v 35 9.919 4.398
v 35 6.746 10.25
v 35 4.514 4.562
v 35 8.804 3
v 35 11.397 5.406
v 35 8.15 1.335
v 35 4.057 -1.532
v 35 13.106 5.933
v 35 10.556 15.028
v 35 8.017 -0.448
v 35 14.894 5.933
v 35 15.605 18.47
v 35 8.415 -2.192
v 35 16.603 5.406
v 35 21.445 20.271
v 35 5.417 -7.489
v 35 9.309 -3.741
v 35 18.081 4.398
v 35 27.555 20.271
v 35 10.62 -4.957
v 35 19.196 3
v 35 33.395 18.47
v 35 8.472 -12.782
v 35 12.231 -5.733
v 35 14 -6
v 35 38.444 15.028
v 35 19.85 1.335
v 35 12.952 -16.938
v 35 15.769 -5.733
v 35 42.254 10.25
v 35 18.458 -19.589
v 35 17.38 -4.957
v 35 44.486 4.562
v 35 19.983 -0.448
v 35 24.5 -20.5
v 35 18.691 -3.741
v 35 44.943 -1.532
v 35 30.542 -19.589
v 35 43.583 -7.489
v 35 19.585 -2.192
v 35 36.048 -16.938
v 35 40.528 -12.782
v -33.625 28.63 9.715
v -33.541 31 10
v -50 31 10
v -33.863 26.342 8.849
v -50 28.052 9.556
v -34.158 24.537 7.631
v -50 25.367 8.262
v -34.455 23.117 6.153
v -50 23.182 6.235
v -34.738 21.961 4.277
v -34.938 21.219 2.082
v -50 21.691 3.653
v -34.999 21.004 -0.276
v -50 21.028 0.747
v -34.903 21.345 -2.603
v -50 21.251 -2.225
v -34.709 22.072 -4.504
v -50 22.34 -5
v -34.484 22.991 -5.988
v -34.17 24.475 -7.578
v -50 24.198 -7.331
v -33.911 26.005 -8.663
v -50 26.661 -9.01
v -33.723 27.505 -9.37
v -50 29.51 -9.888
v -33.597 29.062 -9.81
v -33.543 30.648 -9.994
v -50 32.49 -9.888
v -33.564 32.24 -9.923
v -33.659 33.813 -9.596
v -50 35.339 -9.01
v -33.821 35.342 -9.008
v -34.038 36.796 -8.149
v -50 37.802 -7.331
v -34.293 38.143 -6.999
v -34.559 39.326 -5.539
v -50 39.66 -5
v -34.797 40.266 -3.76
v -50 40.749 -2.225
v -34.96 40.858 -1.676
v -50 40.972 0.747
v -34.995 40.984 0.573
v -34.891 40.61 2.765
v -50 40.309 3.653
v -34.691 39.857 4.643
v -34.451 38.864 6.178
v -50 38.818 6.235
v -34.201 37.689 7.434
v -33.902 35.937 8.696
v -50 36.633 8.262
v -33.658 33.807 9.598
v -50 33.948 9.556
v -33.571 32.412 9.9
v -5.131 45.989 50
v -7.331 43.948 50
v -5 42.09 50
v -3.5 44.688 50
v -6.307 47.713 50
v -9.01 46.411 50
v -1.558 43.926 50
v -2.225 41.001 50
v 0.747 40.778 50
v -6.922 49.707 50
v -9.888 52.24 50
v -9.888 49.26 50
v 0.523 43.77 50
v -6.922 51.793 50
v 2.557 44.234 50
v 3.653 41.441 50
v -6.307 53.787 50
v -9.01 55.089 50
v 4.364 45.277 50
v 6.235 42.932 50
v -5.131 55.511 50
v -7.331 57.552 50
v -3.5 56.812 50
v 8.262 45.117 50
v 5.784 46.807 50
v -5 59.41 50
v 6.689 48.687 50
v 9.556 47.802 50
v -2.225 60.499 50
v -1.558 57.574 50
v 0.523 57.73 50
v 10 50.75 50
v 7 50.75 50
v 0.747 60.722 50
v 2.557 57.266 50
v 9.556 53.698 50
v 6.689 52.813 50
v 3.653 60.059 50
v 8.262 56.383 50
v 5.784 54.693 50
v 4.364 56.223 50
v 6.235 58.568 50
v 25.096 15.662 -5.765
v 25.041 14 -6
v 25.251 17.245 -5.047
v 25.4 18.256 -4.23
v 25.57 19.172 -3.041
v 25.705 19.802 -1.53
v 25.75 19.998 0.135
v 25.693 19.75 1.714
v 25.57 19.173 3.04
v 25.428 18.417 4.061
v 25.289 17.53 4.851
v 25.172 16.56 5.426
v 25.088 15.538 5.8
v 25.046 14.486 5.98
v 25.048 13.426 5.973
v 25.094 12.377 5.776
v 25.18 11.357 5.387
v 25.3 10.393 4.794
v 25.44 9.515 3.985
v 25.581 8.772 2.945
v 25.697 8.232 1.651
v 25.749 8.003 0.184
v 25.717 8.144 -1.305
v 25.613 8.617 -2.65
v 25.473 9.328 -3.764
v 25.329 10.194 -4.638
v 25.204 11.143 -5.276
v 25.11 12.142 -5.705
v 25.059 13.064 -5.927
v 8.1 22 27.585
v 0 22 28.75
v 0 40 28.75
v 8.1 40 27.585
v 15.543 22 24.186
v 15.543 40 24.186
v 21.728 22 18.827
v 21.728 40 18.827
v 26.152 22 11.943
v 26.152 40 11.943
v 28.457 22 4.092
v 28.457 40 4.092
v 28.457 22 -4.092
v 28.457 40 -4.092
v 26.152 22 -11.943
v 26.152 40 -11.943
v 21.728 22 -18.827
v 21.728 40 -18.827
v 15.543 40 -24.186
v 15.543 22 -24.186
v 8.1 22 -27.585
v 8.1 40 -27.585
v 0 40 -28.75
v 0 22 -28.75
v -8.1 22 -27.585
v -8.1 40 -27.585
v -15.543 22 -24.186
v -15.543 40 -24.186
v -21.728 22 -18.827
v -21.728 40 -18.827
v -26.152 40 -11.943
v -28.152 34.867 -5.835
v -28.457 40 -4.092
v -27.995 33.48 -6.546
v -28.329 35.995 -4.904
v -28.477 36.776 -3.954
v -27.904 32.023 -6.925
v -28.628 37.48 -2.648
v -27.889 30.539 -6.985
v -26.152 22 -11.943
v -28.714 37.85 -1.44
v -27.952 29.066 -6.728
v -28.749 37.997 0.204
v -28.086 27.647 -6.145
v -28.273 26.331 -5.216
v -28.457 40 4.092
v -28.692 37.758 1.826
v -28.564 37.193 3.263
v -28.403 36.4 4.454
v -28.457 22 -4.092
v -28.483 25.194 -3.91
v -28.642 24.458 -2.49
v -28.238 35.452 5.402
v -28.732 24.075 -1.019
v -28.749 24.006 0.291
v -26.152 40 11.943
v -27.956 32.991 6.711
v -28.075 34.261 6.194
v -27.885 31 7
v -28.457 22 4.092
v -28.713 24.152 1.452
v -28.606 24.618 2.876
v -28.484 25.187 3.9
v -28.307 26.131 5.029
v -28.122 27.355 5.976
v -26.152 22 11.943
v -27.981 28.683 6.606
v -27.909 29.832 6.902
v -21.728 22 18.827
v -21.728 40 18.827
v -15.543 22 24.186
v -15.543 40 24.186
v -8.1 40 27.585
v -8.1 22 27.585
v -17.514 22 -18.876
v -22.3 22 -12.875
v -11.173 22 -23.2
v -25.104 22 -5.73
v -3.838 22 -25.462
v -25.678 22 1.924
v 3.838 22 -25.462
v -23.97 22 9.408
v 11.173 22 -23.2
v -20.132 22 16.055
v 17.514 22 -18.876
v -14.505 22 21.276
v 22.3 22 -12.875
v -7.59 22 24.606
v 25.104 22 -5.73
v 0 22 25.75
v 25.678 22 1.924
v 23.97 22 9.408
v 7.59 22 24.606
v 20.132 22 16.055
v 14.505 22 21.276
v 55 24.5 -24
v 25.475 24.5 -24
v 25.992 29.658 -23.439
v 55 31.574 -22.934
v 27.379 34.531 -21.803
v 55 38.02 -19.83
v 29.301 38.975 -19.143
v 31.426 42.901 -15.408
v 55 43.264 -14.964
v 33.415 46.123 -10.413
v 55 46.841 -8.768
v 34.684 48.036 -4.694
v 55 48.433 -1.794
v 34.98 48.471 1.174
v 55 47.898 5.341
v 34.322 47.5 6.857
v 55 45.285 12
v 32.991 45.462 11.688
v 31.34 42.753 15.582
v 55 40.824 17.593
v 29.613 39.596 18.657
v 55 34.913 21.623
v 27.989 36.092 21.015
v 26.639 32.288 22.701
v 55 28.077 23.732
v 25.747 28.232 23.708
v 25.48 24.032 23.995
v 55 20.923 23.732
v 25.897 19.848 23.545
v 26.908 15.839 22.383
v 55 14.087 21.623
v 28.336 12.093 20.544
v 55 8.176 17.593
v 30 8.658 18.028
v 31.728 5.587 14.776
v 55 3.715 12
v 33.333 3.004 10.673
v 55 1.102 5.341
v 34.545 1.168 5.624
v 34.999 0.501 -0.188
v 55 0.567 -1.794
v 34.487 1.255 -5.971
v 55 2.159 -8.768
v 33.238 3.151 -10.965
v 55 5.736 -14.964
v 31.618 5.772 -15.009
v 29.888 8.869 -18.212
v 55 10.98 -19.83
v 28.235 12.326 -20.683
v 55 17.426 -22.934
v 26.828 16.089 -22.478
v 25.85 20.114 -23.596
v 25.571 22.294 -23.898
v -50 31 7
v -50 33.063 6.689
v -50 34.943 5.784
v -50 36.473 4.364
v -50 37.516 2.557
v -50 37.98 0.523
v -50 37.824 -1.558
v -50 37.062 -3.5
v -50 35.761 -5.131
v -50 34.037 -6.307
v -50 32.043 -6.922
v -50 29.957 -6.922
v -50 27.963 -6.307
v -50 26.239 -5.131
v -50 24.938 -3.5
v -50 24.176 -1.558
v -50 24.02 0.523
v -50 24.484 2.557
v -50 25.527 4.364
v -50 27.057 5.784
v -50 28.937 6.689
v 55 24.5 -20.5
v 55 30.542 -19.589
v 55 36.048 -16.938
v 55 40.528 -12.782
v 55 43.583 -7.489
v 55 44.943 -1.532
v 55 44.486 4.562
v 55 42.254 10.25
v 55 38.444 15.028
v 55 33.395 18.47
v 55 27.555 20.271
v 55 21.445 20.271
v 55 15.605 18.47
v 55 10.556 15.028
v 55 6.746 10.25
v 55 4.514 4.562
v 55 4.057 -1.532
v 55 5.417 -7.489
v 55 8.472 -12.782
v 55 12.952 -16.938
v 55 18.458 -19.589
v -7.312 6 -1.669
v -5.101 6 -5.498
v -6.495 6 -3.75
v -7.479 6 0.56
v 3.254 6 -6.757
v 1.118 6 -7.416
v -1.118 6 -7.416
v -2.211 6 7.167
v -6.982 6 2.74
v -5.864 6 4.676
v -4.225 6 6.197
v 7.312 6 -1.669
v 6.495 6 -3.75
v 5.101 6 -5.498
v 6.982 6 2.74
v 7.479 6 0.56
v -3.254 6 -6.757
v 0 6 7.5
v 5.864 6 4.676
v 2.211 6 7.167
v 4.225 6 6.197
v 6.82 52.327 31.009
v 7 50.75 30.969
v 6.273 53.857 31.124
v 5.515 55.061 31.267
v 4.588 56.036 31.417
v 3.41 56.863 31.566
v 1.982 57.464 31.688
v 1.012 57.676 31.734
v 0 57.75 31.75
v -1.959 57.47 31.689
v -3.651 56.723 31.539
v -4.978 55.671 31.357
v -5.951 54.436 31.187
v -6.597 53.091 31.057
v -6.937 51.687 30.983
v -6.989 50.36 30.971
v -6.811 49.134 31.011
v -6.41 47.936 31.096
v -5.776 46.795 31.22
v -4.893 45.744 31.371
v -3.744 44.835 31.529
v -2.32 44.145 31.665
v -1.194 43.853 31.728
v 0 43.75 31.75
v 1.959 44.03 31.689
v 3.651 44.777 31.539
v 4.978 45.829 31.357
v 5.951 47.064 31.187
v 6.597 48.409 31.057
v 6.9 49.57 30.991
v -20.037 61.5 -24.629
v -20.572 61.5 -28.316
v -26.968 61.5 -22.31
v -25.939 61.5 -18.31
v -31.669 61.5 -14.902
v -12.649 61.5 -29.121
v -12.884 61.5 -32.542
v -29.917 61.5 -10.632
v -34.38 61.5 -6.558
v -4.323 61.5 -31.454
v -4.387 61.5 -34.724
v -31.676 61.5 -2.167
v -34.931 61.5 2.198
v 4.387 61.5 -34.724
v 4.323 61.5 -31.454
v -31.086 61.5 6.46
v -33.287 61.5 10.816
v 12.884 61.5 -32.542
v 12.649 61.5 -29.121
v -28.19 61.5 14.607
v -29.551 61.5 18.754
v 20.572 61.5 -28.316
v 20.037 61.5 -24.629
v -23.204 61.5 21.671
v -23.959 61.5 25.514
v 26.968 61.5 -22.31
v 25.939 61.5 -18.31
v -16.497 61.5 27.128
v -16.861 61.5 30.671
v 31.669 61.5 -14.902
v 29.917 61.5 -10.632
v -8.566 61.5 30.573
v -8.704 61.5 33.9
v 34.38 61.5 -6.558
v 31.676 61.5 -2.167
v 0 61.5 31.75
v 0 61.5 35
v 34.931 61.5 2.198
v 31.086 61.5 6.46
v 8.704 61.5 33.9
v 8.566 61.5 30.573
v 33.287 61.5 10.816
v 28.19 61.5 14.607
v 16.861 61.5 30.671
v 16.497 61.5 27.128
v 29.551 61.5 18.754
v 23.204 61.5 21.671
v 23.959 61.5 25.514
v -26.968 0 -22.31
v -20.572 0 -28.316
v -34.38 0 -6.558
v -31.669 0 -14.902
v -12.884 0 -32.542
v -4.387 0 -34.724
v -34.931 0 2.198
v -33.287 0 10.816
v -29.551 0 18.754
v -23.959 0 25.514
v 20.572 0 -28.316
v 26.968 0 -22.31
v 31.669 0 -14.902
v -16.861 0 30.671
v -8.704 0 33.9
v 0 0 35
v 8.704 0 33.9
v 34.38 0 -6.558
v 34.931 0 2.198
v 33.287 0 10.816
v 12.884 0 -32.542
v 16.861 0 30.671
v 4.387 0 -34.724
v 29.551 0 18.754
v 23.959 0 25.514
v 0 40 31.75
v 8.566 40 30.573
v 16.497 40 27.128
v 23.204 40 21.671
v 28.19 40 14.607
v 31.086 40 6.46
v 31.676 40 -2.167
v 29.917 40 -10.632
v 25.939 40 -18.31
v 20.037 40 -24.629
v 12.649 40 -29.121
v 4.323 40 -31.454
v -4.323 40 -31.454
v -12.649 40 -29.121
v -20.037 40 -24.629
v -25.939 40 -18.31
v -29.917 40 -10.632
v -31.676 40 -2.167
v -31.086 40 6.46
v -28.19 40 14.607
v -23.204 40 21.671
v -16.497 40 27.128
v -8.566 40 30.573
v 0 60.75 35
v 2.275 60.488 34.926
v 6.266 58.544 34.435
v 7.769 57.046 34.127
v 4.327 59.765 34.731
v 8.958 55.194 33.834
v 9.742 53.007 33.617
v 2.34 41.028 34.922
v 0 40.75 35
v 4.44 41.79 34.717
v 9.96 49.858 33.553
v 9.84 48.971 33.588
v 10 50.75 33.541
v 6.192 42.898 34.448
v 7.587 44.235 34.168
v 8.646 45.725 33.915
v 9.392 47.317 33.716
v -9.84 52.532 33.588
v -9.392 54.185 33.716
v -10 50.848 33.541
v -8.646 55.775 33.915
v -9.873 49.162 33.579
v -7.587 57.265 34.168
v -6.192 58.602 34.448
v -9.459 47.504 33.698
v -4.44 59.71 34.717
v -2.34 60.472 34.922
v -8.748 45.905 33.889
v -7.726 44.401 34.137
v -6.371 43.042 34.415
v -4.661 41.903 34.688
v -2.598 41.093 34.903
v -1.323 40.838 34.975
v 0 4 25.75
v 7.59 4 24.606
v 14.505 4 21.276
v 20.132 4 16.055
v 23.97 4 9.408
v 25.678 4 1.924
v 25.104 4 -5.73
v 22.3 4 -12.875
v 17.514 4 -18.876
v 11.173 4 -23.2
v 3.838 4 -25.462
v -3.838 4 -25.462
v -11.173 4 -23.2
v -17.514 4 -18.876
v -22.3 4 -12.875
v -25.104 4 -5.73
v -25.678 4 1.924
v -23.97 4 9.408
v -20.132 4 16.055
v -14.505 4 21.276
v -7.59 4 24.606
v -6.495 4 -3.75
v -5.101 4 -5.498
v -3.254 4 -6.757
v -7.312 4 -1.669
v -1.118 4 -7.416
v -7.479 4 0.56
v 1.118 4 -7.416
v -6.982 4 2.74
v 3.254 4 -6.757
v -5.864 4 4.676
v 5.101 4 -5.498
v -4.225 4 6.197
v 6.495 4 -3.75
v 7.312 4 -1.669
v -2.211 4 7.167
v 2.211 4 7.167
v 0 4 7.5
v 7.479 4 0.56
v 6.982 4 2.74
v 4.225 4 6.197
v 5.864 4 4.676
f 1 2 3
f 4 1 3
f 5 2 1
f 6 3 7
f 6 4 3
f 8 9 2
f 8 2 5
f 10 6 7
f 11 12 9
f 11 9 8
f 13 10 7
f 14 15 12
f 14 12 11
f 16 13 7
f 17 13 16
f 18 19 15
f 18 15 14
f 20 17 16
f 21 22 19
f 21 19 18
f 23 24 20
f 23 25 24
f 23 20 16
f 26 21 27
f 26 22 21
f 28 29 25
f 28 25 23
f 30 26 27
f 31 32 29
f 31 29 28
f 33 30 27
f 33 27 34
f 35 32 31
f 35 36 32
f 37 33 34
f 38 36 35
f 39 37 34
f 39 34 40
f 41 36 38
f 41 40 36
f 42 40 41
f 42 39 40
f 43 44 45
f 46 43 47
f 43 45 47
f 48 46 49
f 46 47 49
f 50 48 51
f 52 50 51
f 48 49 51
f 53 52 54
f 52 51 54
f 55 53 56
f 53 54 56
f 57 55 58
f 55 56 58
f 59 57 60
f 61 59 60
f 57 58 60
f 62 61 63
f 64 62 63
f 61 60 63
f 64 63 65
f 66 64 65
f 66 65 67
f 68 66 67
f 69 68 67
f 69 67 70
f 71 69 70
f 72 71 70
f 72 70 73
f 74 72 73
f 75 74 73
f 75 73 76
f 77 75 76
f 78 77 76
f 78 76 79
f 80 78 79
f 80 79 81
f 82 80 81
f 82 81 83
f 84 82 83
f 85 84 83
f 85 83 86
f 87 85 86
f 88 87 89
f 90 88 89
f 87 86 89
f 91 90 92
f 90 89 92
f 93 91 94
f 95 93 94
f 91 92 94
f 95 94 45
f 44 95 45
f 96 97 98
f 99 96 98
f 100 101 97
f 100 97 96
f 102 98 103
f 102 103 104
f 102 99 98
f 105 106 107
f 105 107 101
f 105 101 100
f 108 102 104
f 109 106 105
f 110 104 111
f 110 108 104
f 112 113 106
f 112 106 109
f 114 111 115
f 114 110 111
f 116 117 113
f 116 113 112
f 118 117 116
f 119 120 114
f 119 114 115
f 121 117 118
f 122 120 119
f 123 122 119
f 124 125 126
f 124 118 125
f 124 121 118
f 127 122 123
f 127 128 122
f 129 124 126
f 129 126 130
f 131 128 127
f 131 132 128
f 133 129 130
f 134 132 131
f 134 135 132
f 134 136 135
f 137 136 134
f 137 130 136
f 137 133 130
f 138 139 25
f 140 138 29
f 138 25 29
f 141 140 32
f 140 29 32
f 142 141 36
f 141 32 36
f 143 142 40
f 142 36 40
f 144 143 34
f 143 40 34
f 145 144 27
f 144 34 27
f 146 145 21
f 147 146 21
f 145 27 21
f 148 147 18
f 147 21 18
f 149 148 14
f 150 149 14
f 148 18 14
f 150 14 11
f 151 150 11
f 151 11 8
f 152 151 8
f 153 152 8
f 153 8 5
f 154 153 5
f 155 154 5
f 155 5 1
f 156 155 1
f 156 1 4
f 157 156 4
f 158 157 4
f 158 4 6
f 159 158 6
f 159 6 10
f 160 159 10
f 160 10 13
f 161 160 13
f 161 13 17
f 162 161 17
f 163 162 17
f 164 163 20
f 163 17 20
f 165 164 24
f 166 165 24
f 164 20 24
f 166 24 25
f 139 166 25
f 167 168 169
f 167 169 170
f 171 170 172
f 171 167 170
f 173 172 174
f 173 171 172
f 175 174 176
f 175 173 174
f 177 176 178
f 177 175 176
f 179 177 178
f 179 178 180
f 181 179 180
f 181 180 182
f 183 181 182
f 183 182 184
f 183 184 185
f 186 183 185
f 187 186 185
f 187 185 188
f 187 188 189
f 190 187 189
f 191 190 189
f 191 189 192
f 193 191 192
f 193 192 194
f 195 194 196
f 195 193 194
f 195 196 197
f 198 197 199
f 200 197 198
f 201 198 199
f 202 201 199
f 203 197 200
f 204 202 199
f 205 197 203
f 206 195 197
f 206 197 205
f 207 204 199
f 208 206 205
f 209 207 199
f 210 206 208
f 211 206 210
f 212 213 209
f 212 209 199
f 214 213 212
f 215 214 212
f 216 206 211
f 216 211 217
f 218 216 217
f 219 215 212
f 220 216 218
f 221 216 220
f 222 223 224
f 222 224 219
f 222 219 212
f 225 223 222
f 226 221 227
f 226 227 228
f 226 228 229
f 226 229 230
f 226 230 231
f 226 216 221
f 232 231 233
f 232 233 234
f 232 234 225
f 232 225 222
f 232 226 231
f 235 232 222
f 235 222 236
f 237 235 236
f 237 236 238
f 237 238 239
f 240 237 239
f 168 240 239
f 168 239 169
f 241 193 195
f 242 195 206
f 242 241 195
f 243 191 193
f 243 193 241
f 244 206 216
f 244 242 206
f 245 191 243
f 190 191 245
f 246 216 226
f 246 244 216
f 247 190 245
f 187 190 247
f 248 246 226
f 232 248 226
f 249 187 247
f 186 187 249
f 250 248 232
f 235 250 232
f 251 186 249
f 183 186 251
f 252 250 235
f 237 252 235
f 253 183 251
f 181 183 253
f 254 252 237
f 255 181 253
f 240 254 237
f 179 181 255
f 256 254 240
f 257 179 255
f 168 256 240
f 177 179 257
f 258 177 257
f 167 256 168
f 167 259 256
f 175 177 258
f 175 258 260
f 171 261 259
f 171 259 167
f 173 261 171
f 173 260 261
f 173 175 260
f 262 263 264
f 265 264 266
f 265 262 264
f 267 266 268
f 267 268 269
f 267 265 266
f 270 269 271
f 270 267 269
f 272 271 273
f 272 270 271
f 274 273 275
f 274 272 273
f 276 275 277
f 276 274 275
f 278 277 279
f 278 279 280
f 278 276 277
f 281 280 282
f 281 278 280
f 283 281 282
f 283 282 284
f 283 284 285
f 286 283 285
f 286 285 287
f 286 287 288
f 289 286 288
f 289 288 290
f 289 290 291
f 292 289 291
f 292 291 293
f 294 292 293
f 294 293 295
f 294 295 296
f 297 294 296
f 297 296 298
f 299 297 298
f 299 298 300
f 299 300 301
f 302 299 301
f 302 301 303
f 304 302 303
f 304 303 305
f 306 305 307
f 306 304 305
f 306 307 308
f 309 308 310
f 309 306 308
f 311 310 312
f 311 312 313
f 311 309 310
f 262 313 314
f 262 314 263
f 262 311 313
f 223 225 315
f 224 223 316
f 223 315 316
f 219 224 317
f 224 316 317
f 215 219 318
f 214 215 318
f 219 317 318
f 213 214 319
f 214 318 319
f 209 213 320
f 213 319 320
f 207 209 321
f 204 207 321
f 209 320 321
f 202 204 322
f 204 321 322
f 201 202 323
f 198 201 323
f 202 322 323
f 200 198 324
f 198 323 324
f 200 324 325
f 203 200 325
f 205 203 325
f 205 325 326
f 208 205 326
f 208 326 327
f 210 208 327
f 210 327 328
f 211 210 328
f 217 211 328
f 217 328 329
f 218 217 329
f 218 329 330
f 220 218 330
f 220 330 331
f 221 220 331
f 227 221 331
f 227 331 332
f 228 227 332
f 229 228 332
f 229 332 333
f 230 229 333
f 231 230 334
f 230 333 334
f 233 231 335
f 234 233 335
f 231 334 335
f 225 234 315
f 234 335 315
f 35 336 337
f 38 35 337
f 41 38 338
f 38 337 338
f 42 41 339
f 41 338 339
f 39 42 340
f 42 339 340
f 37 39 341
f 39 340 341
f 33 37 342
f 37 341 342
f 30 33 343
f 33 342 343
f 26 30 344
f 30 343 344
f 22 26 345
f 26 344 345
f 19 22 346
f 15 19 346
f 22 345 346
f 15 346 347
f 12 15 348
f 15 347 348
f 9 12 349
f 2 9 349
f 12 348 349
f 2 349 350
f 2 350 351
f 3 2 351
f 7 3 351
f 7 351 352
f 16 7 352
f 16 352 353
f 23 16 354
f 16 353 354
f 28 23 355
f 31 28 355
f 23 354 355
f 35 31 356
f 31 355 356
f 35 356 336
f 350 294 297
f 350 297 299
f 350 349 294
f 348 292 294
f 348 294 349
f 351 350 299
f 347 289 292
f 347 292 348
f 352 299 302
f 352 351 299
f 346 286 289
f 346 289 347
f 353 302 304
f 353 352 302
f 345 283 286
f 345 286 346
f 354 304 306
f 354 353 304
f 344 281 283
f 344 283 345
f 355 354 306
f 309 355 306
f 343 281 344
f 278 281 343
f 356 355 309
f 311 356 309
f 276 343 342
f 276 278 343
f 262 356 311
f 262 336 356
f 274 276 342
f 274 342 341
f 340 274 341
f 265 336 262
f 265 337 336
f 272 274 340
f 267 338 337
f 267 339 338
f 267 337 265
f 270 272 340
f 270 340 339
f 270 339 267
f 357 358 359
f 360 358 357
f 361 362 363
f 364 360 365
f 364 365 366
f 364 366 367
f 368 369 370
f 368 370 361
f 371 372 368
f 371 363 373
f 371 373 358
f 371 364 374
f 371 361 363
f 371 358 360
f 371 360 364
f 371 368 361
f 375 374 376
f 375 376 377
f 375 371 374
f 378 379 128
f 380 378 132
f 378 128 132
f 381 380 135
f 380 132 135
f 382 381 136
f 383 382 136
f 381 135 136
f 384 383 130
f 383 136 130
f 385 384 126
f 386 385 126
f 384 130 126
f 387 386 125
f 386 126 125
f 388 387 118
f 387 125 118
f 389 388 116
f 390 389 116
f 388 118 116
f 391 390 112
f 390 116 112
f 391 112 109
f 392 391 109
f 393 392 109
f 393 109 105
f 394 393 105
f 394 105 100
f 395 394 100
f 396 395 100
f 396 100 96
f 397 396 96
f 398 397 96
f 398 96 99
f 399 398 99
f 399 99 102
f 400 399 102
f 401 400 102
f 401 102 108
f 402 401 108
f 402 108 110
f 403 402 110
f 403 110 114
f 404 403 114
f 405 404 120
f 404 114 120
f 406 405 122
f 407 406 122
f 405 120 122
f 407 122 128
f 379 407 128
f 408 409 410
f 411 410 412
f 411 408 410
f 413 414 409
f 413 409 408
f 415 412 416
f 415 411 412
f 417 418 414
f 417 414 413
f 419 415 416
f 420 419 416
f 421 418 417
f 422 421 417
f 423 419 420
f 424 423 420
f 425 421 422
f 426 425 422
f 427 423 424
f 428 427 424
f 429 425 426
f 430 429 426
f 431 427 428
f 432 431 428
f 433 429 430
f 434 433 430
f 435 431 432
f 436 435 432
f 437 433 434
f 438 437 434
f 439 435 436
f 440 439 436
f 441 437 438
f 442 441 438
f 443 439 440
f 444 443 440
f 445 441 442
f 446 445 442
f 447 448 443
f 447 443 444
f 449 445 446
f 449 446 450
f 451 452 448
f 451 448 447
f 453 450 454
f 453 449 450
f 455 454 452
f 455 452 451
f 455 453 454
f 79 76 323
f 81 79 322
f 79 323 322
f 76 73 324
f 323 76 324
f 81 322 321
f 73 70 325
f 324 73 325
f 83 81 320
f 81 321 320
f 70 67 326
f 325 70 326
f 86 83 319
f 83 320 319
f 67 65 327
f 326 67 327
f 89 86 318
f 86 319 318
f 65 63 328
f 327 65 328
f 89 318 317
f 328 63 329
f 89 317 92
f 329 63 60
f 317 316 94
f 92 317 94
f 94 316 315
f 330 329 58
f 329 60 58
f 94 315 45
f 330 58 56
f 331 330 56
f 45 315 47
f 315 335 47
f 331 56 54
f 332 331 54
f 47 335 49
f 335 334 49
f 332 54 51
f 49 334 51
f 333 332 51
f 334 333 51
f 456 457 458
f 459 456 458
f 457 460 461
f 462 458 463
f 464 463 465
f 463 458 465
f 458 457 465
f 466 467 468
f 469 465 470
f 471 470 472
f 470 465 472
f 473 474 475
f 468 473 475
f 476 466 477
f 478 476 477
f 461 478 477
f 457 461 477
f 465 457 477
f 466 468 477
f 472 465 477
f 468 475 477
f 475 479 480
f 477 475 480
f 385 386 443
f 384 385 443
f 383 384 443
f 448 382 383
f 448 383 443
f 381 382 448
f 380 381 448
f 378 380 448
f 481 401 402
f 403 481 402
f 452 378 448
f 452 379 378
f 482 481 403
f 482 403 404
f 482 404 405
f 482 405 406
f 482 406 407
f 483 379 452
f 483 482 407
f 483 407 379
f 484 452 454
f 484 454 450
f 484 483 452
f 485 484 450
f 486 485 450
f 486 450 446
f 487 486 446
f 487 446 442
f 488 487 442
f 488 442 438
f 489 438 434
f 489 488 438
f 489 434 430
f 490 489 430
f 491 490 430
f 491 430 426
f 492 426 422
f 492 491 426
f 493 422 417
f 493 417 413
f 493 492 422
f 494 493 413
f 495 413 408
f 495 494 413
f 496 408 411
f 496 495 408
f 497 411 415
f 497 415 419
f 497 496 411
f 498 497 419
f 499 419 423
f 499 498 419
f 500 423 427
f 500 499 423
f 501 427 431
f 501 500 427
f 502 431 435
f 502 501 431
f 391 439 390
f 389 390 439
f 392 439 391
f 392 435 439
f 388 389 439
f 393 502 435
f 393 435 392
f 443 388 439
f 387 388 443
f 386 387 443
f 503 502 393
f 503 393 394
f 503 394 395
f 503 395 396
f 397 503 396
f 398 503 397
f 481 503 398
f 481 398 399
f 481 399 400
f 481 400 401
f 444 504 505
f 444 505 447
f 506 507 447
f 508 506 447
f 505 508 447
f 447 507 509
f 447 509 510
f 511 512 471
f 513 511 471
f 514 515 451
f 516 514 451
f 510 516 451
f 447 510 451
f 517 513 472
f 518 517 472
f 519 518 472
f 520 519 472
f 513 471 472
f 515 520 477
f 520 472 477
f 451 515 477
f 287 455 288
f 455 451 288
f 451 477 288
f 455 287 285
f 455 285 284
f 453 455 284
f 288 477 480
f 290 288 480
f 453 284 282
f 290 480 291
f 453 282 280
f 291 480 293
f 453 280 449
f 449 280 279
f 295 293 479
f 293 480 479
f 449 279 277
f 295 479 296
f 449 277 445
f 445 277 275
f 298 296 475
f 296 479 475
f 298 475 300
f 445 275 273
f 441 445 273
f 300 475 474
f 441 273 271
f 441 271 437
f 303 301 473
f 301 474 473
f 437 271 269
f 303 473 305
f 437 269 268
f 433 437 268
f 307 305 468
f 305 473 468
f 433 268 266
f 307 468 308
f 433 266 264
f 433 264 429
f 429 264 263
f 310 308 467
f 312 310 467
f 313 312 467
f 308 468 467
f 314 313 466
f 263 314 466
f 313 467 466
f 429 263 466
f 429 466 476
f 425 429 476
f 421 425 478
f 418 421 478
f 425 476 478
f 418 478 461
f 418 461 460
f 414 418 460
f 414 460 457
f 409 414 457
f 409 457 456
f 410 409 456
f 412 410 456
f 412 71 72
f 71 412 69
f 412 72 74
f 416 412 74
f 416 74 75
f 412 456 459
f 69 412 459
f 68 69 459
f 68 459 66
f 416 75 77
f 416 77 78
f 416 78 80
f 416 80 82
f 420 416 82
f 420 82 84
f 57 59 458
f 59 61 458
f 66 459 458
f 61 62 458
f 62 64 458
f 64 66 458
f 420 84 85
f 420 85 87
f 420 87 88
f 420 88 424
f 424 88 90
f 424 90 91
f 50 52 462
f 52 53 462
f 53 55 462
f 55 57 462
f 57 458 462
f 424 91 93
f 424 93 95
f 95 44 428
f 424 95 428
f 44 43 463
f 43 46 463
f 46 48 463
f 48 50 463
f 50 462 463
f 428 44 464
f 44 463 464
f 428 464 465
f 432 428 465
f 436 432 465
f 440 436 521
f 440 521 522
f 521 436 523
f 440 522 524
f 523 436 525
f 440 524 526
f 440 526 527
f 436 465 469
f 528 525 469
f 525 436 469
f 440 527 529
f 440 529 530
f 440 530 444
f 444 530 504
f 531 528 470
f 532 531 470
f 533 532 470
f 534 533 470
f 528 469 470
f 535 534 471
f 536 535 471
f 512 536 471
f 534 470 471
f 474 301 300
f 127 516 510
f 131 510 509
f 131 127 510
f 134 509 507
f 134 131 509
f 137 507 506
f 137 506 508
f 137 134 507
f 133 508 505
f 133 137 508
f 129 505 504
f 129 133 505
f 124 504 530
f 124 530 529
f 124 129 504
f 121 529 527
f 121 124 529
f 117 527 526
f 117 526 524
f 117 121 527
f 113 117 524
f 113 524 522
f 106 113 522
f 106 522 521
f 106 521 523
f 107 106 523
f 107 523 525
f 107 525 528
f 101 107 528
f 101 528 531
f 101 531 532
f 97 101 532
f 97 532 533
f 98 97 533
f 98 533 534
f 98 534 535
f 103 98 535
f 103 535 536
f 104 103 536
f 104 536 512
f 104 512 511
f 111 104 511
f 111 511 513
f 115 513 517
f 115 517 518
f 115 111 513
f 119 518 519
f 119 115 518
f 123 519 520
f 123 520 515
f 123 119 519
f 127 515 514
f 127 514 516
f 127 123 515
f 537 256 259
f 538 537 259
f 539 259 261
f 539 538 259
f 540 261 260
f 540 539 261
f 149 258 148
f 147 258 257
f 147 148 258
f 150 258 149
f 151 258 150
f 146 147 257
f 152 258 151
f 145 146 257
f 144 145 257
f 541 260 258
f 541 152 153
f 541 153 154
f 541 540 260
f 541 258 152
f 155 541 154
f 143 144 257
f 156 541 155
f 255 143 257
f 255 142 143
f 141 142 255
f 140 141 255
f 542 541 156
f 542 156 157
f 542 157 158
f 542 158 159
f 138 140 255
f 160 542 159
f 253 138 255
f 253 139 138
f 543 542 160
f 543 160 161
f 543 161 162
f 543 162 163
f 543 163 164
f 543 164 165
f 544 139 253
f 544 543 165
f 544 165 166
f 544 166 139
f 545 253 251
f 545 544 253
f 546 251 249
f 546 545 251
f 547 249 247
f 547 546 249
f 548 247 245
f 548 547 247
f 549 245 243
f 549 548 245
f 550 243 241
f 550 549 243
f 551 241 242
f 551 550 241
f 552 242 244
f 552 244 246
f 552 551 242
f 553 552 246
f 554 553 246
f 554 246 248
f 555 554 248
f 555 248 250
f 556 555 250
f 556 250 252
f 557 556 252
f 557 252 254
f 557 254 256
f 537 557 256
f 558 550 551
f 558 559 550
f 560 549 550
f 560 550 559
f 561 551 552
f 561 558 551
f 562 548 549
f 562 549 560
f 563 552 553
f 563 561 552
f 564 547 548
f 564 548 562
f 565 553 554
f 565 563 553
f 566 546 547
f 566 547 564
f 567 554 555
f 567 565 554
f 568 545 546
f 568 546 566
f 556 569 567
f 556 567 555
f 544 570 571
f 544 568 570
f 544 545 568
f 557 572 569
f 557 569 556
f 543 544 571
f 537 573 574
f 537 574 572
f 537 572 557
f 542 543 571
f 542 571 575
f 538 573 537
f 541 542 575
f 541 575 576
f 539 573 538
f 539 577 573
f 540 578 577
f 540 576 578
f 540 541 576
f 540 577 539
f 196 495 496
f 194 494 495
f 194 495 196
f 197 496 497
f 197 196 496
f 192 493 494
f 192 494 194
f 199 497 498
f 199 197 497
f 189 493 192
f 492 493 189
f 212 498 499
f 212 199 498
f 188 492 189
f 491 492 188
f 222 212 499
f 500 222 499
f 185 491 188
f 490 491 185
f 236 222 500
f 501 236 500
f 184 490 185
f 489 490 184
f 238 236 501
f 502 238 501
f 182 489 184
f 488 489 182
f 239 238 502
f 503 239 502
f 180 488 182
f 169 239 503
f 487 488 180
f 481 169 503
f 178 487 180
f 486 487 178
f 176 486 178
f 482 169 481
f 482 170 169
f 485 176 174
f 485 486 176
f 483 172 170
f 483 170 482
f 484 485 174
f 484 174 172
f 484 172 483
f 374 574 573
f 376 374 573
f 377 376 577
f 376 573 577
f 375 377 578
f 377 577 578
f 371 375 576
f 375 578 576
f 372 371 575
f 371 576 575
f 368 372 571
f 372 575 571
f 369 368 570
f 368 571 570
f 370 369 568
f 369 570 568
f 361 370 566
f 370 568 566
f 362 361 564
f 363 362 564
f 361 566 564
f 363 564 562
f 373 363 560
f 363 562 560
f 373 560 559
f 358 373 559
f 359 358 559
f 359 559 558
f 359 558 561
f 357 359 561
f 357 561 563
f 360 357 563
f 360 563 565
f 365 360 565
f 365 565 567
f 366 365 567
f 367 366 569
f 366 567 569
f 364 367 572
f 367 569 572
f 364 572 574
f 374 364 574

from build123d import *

# Parameters (mm, degrees)
SKETCH1_R                  = 35
BASE_DEPTH                 = 4
SKETCH2_R                  = 7.5
CENTERING_BOSS_DEPTH       = 2
SKETCH3_R                  = 35
SKETCH3_R_2                = 25.75
INLET_TIER_DEPTH           = 18
SKETCH4_R                  = 35
SKETCH4_R_2                = 28.75
PATIENT_TIER_DEPTH         = 18
SKETCH5_R                  = 35
SKETCH5_R_2                = 31.75
OUTLET_TIER_DEPTH          = 21.5
INLET_REACH                = 116.487
INLET_END_RADIUS           = 35
SKETCH7_R                  = 24
SKETCH10_R                 = 20.5
INLET_ID_DEPTH             = 20
INLET_PASS_THRU_REACH      = 101.535
INLET_PASS_THRU_END_RADIUS = 25.75
SKETCH11_R                 = 6
BOSS_EXTRUDE8_REACH        = 128.619
BOSS_EXTRUDE8_END_RADIUS   = 35
SKETCH12_R                 = 10
CUT_EXTRUDE3_REACH         = 128.619
CUT_EXTRUDE3_END_RADIUS    = 28.75
SKETCH13_R                 = 7
BOSS_EXTRUDE9_REACH        = 120.458
BOSS_EXTRUDE9_END_RADIUS   = 35
SKETCH14_R                 = 10
CUT_EXTRUDE4_REACH         = 120.458
CUT_EXTRUDE4_END_RADIUS    = 31.75
SKETCH15_R                 = 7


with BuildPart() as part:
    # Sketch1 → Base (new body)
    with BuildSketch(Plane(origin=(0, 0, 0), x_dir=(1, 0, 0), z_dir=(0, 1, 0))):
        with Locations(Location((0, 0, 0), (0, 0, 270))):
            Circle(SKETCH1_R)
    extrude(amount=BASE_DEPTH)

    # Sketch2 → Centering boss (add)
    with BuildSketch(Plane(origin=(0, 4, 0), x_dir=(1, 0, 0), z_dir=(0, 1, 0))):
        with Locations(Location((0, 0, 0), (0, 0, 270))):
            Circle(SKETCH2_R)
    extrude(amount=CENTERING_BOSS_DEPTH)

    # Sketch3 → Inlet tier (add)
    with BuildSketch(Plane(origin=(0, 4, 0), x_dir=(1, 0, 0), z_dir=(0, 1, 0))):
        with Locations(Location((0, 0, 0), (0, 0, 270))):
            Circle(SKETCH3_R)
        with Locations(Location((0, 0, 0), (0, 0, 270))):
            Circle(SKETCH3_R_2, mode=Mode.SUBTRACT)
    extrude(amount=INLET_TIER_DEPTH)

    # Sketch4 → Patient tier (add)
    with BuildSketch(Plane(origin=(0, 22, 0), x_dir=(1, 0, 0), z_dir=(0, 1, 0))):
        with Locations(Location((0, 0, 0), (0, 0, 270))):
            Circle(SKETCH4_R)
        with Locations(Location((0, 0, 0), (0, 0, 270))):
            Circle(SKETCH4_R_2, mode=Mode.SUBTRACT)
    extrude(amount=PATIENT_TIER_DEPTH)

    # Sketch5 → Outlet tier (add)
    with BuildSketch(Plane(origin=(0, 40, 0), x_dir=(1, 0, 0), z_dir=(0, 1, 0))):
        with Locations(Location((0, 0, 0), (0, 0, 270))):
            Circle(SKETCH5_R)
        with Locations(Location((0, 0, 0), (0, 0, 270))):
            Circle(SKETCH5_R_2, mode=Mode.SUBTRACT)
    extrude(amount=OUTLET_TIER_DEPTH)

    # Inlet: up to this cylinder (the profile starts outside it)
    inlet_end = Plane(origin=(0, 24.5, 0), z_dir=(0, -1, 0)) * Cylinder(INLET_END_RADIUS, 303.974, mode=Mode.PRIVATE)
    # Sketch7 → Inlet (add, up to the surface)
    with BuildSketch(Plane(origin=(55, 0, 0), x_dir=(0, 0, -1), z_dir=(1, 0, 0)), mode=Mode.PRIVATE) as inlet_sk1:
        with Locations((0, 24.5)):
            Circle(SKETCH7_R)
    inlet_tool1 = extrude(inlet_sk1.sketch, amount=-INLET_REACH, mode=Mode.PRIVATE) - inlet_end
    add(inlet_tool1.solids().sort_by_distance((55, 24.5, 0))[0])

    # Sketch10 → Inlet ID (cut)
    with BuildSketch(Plane(origin=(55, 0, 0), x_dir=(0, 0, -1), z_dir=(1, 0, 0))):
        with Locations((0, 24.5)):
            Circle(SKETCH10_R)
    extrude(amount=-INLET_ID_DEPTH, mode=Mode.SUBTRACT)

    # Inlet pass thru: up to this cylinder (the profile starts outside it)
    inlet_pass_thru_end = Plane(origin=(0, 14, 0), z_dir=(0, -1, 0)) * Cylinder(INLET_PASS_THRU_END_RADIUS, 255.57, mode=Mode.PRIVATE)
    # Sketch11 → Inlet pass thru (cut, up to the surface)
    with BuildSketch(Plane(origin=(35, 0, 0), x_dir=(0, 0, -1), z_dir=(1, 0, 0)), mode=Mode.PRIVATE) as inlet_pass_thru_sk1:
        with Locations((0, 14)):
            Circle(SKETCH11_R)
    inlet_pass_thru_tool1 = extrude(inlet_pass_thru_sk1.sketch, amount=-INLET_PASS_THRU_REACH, mode=Mode.PRIVATE) - inlet_pass_thru_end
    add(inlet_pass_thru_tool1.solids().sort_by_distance((35, 14, 0))[0], mode=Mode.SUBTRACT)

    # Boss-Extrude8: up to this cylinder (the profile starts outside it)
    boss_extrude8_end = Plane(origin=(0, 31, 0), z_dir=(0, -1, 0)) * Cylinder(BOSS_EXTRUDE8_END_RADIUS, 328.238, mode=Mode.PRIVATE)
    # Sketch12 → Boss-Extrude8 (add, up to the surface)
    with BuildSketch(Plane(origin=(-50, 0, 0), x_dir=(0, 0, -1), z_dir=(1, 0, 0)), mode=Mode.PRIVATE) as boss_extrude8_sk1:
        with Locations(Location((0, 31, 0), (0, 0, 180))):
            Circle(SKETCH12_R)
    boss_extrude8_tool1 = extrude(boss_extrude8_sk1.sketch, amount=BOSS_EXTRUDE8_REACH, mode=Mode.PRIVATE) - boss_extrude8_end
    add(boss_extrude8_tool1.solids().sort_by_distance((-50, 31, 0))[0])

    # Cut-Extrude3: up to this cylinder (the profile starts outside it)
    cut_extrude3_end = Plane(origin=(0, 31, 0), z_dir=(0, -1, 0)) * Cylinder(CUT_EXTRUDE3_END_RADIUS, 315.738, mode=Mode.PRIVATE)
    # Sketch13 → Cut-Extrude3 (cut, up to the surface)
    with BuildSketch(Plane.ZY.offset(50), mode=Mode.PRIVATE) as cut_extrude3_sk1:
        with Locations((0, 31)):
            Circle(SKETCH13_R)
    cut_extrude3_tool1 = extrude(cut_extrude3_sk1.sketch, amount=-CUT_EXTRUDE3_REACH, mode=Mode.PRIVATE) - cut_extrude3_end
    add(cut_extrude3_tool1.solids().sort_by_distance((-50, 31, 0))[0], mode=Mode.SUBTRACT)

    # Boss-Extrude9: up to this cylinder (the profile starts outside it)
    boss_extrude9_end = Plane(origin=(0, 50.75, 0), z_dir=(0, -1, 0)) * Cylinder(BOSS_EXTRUDE9_END_RADIUS, 311.916, mode=Mode.PRIVATE)
    # Sketch14 → Boss-Extrude9 (add, up to the surface)
    with BuildSketch(Plane.XY.offset(50), mode=Mode.PRIVATE) as boss_extrude9_sk1:
        with Locations((0, 50.75)):
            Circle(SKETCH14_R)
    boss_extrude9_tool1 = extrude(boss_extrude9_sk1.sketch, amount=-BOSS_EXTRUDE9_REACH, mode=Mode.PRIVATE) - boss_extrude9_end
    add(boss_extrude9_tool1.solids().sort_by_distance((0, 50.75, 50))[0])

    # Cut-Extrude4: up to this cylinder (the profile starts outside it)
    cut_extrude4_end = Plane(origin=(0, 50.75, 0), z_dir=(0, -1, 0)) * Cylinder(CUT_EXTRUDE4_END_RADIUS, 305.416, mode=Mode.PRIVATE)
    # Sketch15 → Cut-Extrude4 (cut, up to the surface)
    with BuildSketch(Plane.XY.offset(50), mode=Mode.PRIVATE) as cut_extrude4_sk1:
        with Locations((0, 50.75)):
            Circle(SKETCH15_R)
    cut_extrude4_tool1 = extrude(cut_extrude4_sk1.sketch, amount=-CUT_EXTRUDE4_REACH, mode=Mode.PRIVATE) - cut_extrude4_end
    add(cut_extrude4_tool1.solids().sort_by_distance((0, 50.75, 50))[0], mode=Mode.SUBTRACT)


solid = part.part
